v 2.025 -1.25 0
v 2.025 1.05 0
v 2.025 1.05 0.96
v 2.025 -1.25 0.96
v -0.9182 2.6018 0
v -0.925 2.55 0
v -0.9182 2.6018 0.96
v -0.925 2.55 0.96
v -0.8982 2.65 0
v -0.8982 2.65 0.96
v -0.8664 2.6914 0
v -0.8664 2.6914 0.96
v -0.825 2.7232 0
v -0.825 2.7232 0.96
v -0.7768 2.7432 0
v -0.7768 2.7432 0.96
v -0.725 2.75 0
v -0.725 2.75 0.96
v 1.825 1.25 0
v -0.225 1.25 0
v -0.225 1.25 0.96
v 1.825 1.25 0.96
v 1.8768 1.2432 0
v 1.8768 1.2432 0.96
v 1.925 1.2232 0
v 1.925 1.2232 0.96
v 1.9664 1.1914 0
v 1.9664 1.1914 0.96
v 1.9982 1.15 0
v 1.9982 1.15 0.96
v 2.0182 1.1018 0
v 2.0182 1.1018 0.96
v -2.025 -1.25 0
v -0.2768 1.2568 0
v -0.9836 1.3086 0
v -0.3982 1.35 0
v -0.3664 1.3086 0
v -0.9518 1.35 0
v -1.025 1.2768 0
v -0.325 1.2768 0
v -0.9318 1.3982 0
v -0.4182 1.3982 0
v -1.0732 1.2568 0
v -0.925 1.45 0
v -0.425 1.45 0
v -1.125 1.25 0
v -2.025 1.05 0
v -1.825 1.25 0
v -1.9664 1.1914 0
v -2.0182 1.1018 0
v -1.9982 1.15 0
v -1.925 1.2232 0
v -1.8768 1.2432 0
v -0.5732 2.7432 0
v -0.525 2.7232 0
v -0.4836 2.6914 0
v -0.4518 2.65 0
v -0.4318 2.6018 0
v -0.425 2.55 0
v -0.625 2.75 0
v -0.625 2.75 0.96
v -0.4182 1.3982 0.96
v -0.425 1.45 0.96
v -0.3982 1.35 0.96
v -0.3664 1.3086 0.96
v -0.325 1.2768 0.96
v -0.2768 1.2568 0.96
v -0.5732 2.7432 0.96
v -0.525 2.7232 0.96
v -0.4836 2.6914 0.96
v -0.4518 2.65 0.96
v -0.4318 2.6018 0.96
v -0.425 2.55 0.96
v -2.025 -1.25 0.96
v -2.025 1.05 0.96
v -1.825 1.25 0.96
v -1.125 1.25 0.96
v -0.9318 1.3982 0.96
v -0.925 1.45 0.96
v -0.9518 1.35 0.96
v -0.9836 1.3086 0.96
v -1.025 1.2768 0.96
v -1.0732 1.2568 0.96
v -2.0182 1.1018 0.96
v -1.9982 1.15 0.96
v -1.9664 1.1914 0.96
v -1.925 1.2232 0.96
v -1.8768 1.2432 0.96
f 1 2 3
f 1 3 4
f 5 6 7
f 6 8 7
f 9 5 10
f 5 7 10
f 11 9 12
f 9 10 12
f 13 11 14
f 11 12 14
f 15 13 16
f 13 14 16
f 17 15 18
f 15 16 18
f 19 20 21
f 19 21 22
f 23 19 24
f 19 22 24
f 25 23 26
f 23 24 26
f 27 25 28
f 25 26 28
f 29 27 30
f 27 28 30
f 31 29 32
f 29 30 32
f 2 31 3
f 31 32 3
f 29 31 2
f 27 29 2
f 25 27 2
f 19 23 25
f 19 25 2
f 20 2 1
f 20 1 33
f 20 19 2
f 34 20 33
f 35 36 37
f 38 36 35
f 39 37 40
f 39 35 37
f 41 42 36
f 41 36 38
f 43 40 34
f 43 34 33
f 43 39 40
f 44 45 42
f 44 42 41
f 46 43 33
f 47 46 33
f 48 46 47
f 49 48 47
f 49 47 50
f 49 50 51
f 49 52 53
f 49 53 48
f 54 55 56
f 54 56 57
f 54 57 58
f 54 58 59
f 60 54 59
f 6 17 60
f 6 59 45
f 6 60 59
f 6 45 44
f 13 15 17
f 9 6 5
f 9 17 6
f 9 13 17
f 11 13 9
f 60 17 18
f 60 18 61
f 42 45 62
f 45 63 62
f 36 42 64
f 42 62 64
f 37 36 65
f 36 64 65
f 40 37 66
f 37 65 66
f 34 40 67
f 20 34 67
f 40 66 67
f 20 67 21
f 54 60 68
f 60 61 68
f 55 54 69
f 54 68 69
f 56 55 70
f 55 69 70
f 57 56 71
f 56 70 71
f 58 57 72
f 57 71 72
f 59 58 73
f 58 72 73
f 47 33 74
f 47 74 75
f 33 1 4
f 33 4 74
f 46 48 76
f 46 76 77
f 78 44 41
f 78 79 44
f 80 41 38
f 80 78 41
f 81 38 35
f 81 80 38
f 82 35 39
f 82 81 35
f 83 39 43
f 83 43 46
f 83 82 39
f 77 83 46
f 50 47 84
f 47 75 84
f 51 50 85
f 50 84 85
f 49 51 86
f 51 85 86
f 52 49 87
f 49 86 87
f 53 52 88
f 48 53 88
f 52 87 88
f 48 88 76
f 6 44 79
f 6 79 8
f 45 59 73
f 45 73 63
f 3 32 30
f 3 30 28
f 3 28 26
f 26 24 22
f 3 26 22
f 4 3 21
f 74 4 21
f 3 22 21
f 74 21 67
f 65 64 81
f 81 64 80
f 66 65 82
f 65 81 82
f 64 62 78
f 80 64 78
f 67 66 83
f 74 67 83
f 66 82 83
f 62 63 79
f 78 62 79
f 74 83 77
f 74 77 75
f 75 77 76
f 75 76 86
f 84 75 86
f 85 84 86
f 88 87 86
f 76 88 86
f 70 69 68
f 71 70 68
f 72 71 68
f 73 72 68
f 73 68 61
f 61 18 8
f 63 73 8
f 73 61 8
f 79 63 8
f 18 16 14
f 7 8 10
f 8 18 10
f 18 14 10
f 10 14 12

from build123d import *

# Parameters (mm, degrees)
BOSS_EXTRUDE1_DEPTH = 0.96
FILLET1_R           = 0.2


with BuildPart() as part:
    # Sketch1 → Boss-Extrude1 (new body)
    with BuildSketch(Plane.XY):
        Polygon((-0.925, 1.25), (-0.925, 2.75), (-0.425, 2.75), (-0.425, 1.25), (2.025, 1.25), (2.025, -1.25), (-2.025, -1.25), (-2.025, 1.25), align=None)
    extrude(amount=BOSS_EXTRUDE1_DEPTH)

    # Fillet1
    fillet1_edges = [part.edges().sort_by_distance(p)[0] for p in [
        (-2.025, 1.25, 0.48),
        (-0.925, 1.25, 0.48),
        (-0.925, 2.75, 0.48),
        (-0.425, 2.75, 0.48),
        (-0.425, 1.25, 0.48),
        (2.025, 1.25, 0.48),
    ]]
    fillet(fillet1_edges, radius=FILLET1_R)


solid = part.part
